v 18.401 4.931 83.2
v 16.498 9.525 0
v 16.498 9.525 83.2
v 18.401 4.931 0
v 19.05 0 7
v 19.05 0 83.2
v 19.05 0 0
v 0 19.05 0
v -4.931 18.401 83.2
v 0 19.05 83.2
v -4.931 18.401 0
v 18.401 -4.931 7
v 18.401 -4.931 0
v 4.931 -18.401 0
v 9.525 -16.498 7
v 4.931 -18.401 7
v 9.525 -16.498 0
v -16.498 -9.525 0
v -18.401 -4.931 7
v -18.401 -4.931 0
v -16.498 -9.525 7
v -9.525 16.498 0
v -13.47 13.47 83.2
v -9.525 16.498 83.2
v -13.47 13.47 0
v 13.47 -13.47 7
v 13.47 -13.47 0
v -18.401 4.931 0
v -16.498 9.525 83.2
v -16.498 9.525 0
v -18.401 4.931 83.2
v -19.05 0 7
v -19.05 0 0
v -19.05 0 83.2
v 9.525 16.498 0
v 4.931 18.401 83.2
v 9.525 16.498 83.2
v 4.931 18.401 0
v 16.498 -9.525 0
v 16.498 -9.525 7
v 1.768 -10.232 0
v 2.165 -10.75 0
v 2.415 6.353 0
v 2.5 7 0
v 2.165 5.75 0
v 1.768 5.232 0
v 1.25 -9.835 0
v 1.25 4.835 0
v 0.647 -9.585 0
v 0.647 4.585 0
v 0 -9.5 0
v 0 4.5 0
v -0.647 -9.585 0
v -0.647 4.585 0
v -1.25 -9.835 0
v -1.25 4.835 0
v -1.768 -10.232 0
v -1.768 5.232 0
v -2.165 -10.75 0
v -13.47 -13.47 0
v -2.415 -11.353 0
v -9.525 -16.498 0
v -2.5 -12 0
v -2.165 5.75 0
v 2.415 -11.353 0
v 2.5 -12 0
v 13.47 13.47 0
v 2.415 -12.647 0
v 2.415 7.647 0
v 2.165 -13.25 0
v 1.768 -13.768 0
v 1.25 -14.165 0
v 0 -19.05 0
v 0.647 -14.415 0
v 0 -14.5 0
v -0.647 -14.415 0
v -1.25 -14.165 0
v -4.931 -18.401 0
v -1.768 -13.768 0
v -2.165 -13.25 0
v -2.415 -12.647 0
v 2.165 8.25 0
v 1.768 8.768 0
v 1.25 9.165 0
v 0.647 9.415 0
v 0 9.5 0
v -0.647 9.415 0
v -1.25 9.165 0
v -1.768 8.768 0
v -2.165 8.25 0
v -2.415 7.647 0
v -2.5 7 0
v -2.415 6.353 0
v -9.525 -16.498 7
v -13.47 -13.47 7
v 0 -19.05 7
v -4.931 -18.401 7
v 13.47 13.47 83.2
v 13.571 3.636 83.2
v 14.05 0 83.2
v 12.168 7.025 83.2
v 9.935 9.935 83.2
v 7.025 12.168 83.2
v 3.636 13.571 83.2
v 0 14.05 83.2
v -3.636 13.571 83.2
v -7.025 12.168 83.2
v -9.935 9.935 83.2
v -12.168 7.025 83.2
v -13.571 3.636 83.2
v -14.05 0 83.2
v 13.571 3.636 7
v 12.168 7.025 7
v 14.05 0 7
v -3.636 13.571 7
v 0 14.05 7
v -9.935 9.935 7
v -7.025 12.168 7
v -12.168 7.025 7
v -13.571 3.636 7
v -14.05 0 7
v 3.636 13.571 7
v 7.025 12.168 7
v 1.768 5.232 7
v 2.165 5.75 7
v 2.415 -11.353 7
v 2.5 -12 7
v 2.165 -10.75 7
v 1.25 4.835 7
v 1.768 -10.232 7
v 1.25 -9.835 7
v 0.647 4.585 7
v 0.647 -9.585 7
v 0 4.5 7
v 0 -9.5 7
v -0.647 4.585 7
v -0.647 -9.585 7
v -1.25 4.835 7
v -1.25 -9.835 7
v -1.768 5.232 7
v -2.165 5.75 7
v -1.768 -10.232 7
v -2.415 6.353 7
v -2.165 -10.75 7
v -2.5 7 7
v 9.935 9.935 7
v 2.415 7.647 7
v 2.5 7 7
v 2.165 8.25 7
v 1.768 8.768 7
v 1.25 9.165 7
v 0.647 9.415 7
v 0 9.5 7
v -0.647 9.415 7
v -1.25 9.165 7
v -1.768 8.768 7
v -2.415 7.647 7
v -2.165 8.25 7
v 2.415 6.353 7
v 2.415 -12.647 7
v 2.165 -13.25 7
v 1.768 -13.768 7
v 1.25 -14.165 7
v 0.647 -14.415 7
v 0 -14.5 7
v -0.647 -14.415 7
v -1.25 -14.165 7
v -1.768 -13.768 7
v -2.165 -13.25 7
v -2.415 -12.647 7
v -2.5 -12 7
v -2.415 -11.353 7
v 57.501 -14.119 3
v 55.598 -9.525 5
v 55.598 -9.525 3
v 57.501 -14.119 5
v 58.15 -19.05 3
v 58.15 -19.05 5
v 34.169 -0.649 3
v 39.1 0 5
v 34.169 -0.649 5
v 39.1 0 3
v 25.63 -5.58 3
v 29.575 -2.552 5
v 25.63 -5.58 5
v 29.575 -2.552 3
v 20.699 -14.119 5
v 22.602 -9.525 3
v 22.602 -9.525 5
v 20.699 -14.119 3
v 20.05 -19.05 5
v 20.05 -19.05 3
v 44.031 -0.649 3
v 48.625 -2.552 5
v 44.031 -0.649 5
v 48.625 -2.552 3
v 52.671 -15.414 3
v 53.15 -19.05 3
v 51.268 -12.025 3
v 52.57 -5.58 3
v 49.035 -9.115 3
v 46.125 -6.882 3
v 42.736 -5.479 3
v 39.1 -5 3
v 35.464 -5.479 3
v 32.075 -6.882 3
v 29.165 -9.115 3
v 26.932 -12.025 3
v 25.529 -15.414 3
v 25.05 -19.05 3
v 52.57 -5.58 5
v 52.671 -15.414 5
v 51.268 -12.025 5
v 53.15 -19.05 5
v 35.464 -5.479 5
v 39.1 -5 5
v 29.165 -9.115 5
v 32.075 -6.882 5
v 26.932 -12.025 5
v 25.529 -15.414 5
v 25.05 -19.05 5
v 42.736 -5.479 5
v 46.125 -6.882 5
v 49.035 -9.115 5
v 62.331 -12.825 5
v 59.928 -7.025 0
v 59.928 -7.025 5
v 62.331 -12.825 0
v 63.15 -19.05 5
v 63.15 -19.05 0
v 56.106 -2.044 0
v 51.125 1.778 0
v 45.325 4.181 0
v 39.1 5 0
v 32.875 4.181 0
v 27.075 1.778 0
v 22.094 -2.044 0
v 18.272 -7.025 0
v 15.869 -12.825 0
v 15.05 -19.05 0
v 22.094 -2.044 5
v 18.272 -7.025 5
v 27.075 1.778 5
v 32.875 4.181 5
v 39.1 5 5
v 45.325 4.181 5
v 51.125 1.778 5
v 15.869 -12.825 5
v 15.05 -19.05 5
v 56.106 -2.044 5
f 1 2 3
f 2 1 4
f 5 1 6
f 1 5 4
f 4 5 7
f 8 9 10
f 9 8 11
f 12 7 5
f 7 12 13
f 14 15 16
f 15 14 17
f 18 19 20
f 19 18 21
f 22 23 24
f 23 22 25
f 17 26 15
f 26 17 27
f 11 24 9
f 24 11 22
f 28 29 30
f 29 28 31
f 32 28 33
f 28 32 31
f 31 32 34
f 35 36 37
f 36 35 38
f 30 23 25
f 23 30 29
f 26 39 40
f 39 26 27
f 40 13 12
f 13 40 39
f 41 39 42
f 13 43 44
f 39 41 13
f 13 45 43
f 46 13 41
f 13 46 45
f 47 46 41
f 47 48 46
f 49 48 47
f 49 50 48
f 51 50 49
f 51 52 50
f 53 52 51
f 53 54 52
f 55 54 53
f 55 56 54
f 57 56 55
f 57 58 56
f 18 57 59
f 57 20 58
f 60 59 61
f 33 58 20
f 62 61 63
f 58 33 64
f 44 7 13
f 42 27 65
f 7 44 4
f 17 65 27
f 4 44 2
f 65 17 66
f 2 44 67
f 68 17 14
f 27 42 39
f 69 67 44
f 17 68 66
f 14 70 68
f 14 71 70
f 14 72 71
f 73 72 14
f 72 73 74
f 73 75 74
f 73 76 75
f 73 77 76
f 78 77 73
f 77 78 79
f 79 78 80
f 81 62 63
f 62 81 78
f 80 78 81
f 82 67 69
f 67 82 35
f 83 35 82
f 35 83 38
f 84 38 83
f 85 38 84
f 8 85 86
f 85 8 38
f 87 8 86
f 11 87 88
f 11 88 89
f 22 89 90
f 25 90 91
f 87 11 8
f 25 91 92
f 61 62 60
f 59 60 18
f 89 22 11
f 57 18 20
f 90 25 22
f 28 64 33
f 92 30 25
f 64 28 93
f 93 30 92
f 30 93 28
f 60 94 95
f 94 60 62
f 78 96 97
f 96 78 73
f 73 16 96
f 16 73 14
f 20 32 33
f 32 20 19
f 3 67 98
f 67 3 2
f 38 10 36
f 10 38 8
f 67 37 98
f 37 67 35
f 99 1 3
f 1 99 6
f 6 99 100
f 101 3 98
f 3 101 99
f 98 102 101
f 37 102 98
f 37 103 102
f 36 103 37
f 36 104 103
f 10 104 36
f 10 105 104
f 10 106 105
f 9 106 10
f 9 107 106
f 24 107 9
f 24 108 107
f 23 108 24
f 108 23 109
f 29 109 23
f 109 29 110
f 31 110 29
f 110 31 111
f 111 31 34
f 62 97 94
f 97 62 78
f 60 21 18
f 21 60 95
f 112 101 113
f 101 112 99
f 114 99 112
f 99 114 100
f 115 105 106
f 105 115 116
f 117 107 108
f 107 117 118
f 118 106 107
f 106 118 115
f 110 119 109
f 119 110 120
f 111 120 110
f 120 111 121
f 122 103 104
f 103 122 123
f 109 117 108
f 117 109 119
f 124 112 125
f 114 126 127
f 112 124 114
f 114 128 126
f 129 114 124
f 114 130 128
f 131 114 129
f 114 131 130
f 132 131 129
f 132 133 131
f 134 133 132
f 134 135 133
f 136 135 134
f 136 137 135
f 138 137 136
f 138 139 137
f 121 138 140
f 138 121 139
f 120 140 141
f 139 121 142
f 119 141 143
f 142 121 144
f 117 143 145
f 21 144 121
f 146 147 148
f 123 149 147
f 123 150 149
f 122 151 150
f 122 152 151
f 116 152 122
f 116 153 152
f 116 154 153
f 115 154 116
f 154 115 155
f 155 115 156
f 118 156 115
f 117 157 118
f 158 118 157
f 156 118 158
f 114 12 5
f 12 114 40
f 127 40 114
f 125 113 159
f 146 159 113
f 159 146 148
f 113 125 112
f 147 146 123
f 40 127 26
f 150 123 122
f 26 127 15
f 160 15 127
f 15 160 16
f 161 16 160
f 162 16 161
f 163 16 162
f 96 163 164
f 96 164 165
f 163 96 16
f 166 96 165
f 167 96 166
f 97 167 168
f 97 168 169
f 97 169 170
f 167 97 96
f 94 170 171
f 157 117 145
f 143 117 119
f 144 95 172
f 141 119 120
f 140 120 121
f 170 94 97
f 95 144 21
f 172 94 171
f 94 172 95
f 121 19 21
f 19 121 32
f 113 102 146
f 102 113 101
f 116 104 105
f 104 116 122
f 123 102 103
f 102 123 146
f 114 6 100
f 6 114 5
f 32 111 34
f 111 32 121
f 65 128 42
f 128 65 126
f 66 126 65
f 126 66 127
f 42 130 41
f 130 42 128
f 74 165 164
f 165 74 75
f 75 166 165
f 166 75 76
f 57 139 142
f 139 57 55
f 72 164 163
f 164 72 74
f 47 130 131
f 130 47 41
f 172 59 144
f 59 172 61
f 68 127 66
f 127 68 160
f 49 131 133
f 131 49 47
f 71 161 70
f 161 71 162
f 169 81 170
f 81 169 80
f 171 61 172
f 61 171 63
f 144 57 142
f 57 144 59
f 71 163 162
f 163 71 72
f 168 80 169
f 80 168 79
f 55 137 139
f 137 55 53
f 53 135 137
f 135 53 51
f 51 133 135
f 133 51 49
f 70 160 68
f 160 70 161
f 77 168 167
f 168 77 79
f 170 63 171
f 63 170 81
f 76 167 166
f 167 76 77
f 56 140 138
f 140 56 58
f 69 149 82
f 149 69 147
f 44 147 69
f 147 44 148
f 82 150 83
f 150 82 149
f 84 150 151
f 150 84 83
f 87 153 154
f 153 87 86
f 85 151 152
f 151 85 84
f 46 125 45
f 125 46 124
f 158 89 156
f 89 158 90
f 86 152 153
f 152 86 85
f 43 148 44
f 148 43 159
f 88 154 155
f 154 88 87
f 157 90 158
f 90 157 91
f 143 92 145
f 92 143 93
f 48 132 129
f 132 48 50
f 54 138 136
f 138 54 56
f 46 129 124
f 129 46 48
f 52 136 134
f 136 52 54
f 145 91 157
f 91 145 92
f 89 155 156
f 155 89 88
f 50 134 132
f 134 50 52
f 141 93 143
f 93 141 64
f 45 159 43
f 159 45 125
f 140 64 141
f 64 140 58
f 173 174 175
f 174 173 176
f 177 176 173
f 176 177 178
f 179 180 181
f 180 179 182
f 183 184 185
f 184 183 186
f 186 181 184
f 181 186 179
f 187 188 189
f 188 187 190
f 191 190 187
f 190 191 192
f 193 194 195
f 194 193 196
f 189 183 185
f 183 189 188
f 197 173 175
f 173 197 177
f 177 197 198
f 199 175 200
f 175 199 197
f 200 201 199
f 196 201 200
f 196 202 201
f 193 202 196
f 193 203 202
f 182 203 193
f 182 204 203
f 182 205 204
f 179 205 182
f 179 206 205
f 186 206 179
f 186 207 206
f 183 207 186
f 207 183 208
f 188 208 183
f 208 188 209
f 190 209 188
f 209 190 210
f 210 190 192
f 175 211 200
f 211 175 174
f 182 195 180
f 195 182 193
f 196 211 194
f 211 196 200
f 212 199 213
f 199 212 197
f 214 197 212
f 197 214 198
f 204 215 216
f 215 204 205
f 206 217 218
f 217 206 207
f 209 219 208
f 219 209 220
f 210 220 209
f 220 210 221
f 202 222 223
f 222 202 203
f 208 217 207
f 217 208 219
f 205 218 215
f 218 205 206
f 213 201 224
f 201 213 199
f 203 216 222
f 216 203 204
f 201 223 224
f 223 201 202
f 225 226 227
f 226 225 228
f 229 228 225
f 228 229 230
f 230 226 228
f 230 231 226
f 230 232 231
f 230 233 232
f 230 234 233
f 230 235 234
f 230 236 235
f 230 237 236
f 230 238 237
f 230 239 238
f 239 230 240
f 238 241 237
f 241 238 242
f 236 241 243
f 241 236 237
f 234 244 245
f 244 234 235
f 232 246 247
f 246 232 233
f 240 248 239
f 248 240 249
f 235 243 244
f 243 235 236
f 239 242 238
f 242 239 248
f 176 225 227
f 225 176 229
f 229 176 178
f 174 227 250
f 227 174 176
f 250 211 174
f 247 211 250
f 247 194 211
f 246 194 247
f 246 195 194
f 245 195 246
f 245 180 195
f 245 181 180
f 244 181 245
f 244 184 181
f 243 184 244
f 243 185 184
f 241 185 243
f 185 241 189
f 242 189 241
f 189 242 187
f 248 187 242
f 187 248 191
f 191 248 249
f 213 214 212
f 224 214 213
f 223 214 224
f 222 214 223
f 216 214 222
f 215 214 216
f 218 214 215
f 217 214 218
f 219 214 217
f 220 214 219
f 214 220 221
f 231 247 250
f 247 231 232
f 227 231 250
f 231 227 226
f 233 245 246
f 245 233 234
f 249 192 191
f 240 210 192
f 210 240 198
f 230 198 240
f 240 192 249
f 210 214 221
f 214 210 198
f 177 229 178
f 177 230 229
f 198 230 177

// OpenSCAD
// file: ../lib/bom.scad
/* -*- mode: scad; c-basic-offset: 4; c-file-style: "k&r"; indent-tabs-mode: nil -*-
 *
 * Copyright (C) 2014  Łukasz Stelmach
 *
 * This program is free software: you can redistribute it and/or modify
 * it under the terms of the GNU General Public License as published by
 * the Free Software Foundation, either version 3 of the License, or
 * (at your option) any later version.
 *
 * This program is distributed in the hope that it will be useful,
 * but WITHOUT ANY WARRANTY; without even the implied warranty of
 * MERCHANTABILITY or FITNESS FOR A PARTICULAR PURPOSE.  See the
 * GNU General Public License for more details.
 *
 * You should have received a copy of the GNU General Public License
 * along with this program.  If not, see <http://www.gnu.org/licenses/>.
 *
 */

/// \file bom.scad Utility modules for building BOM. Inspired by Chris
/// Palmer's Mendel90 bom.scad.


module bom_fff()
{
    echo (str ("BOM: FFF ", parent_module ()));
}

module assembly(name="UNKNOWN")
{
    //if (BOM > 0)
        echo (str ("BOM: assembly ", parent_module () ? parent_module () : name, "/"));
}

module end(name="UNKNOWN")
{
    //if (BOM > 0)
        echo(str("BOM: assembly /", parent_module () ? parent_module () : name));
}
// main file
/* -*- mode: scad; c-basic-offset: 4; c-file-style: "k&r"; indent-tabs-mode: nil -*-
 *
 * Copyright (C) 2014  Łukasz Stelmach
 *
 * This program is free software: you can redistribute it and/or modify
 * it under the terms of the GNU General Public License as published by
 * the Free Software Foundation, either version 3 of the License, or
 * (at your option) any later version.
 *
 * This program is distributed in the hope that it will be useful,
 * but WITHOUT ANY WARRANTY; without even the implied warranty of
 * MERCHANTABILITY or FITNESS FOR A PARTICULAR PURPOSE.  See the
 * GNU General Public License for more details.
 *
 * You should have received a copy of the GNU General Public License
 * along with this program.  If not, see <http://www.gnu.org/licenses/>.
 *
 */

/// file p011.scad Spool holder

use <../lib/bom.scad>

module p011_a ()
{
    dia1=38.10;
    dia2=dia1-10;
    difference ()
    {
        translate ([0, 0, 0]) cylinder(d=dia1, h=83.2, $fn=24);
        translate ([0, 0, 7]) cylinder(d=dia2, h=80, $fn=24);
        translate ([-1 - dia1/2,-1-dia1/2,7])
            cube ([dia1+2, 1+dia1/2 , 80]);
        // TODO: create p011_a_mounting()
        translate ([0,7.05 - dia1/2,-1]) cylinder(d=5, h=9, $fn=24);
        translate ([0,26.05 - dia1/2,-1]) cylinder(d=5, h=9, $fn=24);
    }

    bom_fff();
}

module p011_b ()
{
    dia1 = 48.10;
    dia2 = 38.10;
    dia3 = dia2 - 10;

    difference ()
    {
        cylinder (d=dia1, h=5, $fn=24);

        translate ([0, 0, 3])
            difference ()
        {
            cylinder (d=dia2, h=10, $fn=24);
            translate ([0, 0, -1])
                cylinder (d=dia3, h=12, $fn=24);
        }
        translate ([0, -30, 0])
            cube (60,center=true);
    }

    bom_fff();
}

module p011 ()
{
    p011_a();
    translate ([48.10/2 + 38.10/2 - 4, -38.10/2, 0])
        p011_b();
}

p011 ();

/*
============== Size ==============
Min X =  14.660253, Max X =  52.760254
Min Y =  5.165156, Max Y =  43.265156
Min Z =  0.000000, Max Z =  83.199997
*/
//translate([-14.660253, -5.165156, 0])
//import("../original/spool holder P-011.stl");

/*
============== Size ==============
Min X =  7.213617, Max X =  55.313618
Min Y =  8.860742, Max Y =  32.910740
Min Z =  7.100000, Max Z =  12.100000
*/
//translate([30.886384, -8.860742, -7.100000])
//import("../original/spool holder 2 P-011.stl");
